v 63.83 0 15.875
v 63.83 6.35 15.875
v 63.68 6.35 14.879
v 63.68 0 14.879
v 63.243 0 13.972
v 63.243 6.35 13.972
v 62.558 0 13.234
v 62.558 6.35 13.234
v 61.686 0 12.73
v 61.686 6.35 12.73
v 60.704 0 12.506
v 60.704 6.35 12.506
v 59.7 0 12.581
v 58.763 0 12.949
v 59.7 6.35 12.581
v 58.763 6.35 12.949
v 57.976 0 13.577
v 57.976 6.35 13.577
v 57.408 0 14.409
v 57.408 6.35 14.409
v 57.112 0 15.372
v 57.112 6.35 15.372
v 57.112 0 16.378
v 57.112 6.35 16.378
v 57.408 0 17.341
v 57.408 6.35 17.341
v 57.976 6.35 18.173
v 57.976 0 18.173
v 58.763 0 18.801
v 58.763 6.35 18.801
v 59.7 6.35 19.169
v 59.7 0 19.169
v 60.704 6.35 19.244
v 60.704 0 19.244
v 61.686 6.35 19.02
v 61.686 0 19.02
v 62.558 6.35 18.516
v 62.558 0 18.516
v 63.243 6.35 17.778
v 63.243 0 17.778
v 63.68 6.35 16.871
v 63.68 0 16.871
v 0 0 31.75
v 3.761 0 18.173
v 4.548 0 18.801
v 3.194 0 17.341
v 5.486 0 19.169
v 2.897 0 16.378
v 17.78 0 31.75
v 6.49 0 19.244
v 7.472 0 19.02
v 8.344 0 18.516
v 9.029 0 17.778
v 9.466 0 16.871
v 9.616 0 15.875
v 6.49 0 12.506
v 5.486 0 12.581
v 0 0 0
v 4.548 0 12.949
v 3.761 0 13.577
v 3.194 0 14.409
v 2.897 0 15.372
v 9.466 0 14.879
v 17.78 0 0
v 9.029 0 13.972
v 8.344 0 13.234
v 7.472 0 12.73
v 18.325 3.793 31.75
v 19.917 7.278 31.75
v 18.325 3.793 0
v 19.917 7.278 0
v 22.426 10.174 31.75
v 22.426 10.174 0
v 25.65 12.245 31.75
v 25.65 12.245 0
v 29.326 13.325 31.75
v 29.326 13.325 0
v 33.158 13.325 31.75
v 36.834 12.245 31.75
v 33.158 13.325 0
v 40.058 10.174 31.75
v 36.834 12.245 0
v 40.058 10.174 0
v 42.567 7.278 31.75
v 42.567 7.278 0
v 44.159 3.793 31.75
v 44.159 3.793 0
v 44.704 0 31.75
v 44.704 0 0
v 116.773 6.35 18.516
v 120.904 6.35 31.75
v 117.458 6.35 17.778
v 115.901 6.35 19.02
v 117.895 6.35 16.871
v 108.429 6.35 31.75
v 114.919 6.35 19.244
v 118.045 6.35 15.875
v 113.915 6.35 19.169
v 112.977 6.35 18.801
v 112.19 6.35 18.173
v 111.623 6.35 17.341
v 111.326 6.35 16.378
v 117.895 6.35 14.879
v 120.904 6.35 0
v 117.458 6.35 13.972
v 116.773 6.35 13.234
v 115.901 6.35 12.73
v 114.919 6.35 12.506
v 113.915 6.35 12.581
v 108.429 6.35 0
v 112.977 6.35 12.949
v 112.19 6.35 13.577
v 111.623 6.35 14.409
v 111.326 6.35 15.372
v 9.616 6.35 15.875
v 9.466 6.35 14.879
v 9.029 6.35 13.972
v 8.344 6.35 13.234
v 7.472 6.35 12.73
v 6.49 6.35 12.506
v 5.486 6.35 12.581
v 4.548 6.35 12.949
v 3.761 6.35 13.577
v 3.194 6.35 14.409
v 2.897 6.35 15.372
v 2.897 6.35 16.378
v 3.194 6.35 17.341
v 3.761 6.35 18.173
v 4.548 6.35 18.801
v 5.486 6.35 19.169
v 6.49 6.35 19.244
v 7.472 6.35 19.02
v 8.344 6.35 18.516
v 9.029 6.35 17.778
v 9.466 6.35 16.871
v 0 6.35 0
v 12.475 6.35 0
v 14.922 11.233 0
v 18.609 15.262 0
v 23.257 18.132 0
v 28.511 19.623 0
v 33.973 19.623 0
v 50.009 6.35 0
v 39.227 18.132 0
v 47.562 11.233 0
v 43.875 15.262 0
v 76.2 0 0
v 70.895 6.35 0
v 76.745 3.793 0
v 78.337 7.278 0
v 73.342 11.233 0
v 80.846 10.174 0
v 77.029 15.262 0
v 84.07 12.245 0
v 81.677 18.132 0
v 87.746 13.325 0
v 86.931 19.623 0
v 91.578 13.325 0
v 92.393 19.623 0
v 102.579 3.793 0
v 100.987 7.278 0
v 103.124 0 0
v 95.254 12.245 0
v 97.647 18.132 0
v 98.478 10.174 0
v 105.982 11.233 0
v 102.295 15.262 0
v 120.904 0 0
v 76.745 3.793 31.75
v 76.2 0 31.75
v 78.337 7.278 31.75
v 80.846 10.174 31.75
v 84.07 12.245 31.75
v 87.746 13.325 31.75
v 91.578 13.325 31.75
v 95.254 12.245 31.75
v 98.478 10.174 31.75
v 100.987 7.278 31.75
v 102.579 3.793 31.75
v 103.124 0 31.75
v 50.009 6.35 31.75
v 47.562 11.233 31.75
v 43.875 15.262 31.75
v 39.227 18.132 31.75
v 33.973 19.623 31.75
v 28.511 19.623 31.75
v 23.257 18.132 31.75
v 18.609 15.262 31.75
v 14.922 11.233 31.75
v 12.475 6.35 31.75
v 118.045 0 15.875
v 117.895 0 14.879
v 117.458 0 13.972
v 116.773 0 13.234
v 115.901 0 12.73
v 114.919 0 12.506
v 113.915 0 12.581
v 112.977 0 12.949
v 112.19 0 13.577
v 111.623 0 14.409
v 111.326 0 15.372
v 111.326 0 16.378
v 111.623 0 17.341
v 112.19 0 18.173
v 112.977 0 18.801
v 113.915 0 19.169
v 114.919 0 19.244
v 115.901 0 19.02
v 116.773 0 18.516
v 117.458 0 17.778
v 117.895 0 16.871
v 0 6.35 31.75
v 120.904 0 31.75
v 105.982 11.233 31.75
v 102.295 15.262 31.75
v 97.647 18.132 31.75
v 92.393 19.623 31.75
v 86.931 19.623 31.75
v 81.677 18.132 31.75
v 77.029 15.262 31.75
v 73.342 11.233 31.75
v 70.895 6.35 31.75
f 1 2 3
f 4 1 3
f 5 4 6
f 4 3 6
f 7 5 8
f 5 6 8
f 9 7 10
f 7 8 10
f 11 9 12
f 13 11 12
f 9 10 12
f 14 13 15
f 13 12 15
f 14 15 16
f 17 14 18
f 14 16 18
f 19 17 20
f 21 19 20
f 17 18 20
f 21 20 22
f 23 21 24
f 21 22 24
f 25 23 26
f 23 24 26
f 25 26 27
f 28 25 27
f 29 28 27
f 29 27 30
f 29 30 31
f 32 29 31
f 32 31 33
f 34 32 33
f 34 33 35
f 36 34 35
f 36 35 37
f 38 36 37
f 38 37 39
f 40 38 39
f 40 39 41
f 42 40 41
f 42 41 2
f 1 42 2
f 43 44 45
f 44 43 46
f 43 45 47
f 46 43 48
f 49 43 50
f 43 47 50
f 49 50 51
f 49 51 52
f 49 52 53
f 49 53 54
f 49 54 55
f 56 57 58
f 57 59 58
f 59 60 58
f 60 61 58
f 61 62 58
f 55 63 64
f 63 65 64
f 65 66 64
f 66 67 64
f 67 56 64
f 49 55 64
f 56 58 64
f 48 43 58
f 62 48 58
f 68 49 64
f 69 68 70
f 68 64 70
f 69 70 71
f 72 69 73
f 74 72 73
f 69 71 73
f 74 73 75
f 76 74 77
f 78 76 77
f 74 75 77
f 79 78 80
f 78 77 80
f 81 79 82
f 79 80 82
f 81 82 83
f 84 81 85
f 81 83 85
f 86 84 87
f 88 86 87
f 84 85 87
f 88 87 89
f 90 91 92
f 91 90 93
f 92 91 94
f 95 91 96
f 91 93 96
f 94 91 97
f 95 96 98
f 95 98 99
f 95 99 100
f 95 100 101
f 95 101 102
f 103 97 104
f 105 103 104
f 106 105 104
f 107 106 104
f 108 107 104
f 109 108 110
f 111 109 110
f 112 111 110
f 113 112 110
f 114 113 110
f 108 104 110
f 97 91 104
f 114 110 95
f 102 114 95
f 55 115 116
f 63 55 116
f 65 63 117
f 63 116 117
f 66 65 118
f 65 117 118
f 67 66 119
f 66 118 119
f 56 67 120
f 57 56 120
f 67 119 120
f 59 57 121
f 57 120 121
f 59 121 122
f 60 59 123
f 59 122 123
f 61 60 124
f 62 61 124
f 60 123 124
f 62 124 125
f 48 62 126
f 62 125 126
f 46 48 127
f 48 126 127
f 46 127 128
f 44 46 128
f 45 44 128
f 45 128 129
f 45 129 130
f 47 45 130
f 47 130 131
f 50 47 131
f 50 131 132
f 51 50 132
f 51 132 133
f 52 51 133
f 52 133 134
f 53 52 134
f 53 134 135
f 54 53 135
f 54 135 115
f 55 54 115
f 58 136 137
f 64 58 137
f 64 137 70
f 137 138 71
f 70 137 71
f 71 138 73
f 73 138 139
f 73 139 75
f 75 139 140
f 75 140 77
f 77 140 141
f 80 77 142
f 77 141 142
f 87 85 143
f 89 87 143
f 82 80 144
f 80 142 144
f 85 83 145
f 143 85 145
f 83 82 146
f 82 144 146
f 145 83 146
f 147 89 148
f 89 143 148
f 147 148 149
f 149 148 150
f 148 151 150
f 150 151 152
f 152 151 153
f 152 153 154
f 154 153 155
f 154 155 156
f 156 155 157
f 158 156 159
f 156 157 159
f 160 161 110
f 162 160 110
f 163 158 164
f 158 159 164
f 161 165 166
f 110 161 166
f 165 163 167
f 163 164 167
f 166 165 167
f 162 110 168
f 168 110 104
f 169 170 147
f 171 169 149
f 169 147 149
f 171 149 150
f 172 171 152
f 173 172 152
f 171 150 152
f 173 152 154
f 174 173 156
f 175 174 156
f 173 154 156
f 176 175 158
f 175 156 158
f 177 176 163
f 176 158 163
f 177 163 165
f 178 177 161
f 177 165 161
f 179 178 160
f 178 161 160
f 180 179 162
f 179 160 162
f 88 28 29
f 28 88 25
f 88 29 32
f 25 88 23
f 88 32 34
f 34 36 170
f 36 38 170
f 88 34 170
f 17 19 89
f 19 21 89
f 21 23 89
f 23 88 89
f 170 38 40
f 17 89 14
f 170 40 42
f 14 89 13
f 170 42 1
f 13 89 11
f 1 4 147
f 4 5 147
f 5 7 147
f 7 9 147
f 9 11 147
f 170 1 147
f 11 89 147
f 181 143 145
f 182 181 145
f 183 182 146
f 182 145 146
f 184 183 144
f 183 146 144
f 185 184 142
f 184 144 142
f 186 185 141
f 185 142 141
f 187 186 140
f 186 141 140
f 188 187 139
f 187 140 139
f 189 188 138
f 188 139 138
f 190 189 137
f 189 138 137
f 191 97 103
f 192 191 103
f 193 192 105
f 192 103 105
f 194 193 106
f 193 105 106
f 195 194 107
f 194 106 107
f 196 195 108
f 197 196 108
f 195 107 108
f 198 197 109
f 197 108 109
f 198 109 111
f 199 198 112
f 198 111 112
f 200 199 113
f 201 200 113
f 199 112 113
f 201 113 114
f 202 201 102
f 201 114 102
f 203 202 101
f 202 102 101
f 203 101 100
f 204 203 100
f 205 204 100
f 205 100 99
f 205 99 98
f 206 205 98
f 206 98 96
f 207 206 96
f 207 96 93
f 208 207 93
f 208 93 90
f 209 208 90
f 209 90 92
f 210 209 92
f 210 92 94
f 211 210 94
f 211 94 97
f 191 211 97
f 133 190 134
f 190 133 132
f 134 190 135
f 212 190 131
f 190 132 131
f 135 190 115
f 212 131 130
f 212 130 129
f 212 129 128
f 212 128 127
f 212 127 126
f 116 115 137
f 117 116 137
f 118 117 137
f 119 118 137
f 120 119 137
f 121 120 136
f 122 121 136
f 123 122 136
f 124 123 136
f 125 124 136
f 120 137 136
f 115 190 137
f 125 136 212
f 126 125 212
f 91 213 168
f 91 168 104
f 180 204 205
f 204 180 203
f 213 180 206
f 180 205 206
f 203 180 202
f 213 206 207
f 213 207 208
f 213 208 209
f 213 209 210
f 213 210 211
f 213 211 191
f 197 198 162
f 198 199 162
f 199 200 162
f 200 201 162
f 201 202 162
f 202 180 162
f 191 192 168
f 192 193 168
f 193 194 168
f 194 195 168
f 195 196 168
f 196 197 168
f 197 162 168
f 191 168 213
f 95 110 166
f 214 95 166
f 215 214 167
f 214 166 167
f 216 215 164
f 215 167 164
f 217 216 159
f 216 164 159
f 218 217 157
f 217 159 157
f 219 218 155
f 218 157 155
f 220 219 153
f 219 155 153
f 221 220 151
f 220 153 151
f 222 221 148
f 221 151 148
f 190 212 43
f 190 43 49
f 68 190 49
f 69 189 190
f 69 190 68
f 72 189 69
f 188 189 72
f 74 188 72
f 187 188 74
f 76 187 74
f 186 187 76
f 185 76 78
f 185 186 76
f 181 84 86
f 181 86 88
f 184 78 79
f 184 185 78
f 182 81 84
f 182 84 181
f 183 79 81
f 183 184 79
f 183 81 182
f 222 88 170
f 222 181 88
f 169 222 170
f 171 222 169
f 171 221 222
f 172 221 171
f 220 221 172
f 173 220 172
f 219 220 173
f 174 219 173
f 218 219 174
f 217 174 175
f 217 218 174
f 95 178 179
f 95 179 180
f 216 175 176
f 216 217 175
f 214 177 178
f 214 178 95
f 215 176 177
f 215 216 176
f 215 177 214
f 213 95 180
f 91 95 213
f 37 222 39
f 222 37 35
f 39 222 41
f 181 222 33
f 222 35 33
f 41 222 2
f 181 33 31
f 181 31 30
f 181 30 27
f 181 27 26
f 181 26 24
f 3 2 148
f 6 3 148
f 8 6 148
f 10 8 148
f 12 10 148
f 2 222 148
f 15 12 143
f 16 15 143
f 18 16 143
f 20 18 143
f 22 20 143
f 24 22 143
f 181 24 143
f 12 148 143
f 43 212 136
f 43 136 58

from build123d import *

# Parameters (mm, degrees)
BOSS_EXTRUDE1_DEPTH = 31.75
SKETCH3_R           = 3.3782
CUT_EXTRUDE1_DEPTH  = 7.35


with BuildPart() as part:
    # Sketch1 → Boss-Extrude1 (new body)
    with BuildSketch(Plane.XY):
        with BuildLine():
            Line((12.475198354, 6.35), (0, 6.35))
            Line((0, 6.35), (0, 0))
            Line((0, 0), (17.78, 0))
            ThreePointArc((17.78, 0), (31.242, 13.462), (44.704, 0))
            Line((44.704, 0), (76.2, 0))
            ThreePointArc((76.2, 0), (89.662, 13.462), (103.124, 0))
            Line((103.124, 0), (120.904, 0))
            Line((120.904, 0), (120.904, 6.35))
            Line((120.904, 6.35), (108.428801646, 6.35))
            ThreePointArc((108.428801646, 6.35), (89.662, 19.812), (70.895198354, 6.35))
            Line((70.895198354, 6.35), (50.008801646, 6.35))
            ThreePointArc((50.008801646, 6.35), (31.242, 19.812), (12.475198354, 6.35))
        make_face()
    extrude(amount=BOSS_EXTRUDE1_DEPTH)

    # Sketch3 → Cut-Extrude1 (cut, through all)
    with BuildSketch(Plane(origin=(0, 6.35, 0), x_dir=(1, 0, 0), z_dir=(0, 1, 0))):
        with Locations((6.237599177, -15.875)):
            Circle(SKETCH3_R)
        with Locations((60.452, -15.875)):
            Circle(SKETCH3_R)
        with Locations((114.666400823, -15.875)):
            Circle(SKETCH3_R)
    extrude(amount=-CUT_EXTRUDE1_DEPTH, mode=Mode.SUBTRACT)


solid = part.part
